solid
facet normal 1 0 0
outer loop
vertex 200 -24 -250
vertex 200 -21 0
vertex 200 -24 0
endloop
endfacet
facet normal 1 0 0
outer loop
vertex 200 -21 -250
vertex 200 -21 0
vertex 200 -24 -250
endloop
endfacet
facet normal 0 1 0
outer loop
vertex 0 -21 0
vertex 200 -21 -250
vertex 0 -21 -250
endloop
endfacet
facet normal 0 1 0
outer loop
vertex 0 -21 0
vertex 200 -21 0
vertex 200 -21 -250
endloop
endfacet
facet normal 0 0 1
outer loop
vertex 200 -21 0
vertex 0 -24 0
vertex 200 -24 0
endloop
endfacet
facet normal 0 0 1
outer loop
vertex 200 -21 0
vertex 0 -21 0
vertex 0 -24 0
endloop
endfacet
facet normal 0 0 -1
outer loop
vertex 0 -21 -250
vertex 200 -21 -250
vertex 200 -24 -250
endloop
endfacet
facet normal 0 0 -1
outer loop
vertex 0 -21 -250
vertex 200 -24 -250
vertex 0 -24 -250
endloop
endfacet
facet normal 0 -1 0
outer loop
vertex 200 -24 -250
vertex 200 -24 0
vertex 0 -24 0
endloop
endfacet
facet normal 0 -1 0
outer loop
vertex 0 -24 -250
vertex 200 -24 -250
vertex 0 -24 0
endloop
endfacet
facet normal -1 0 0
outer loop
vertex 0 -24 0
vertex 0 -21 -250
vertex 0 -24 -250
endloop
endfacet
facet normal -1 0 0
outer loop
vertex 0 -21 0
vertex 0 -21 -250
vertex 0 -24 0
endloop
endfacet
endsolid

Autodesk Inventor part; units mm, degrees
ref_plane "YZ Plane" through (0, 0, 0) normal (1, 0, 0) x (0, 1, 0)
ref_plane "XZ Plane" through (0, 0, 0) normal (0, 1, 0) x (-1, 0, 0)
ref_plane "XY Plane" through (0, 0, 0) normal (0, 0, 1) x (1, 0, 0)
sketch "block" plane through (0, 0, 0) normal (0, 1, 0) x (-1, 0, 0)
  line L0 (0, 0) -> (-200, 0)
  line L1 (-200, 0) -> (-200, -250)
  line L2 (-200, -250) -> (0, -250)
  line L3 (0, -250) -> (0, 0)
  dimension "d31" = 200
  dimension "d32" = 250
extrude "ext_block" add sketch "block" against normal blind 24
shell "Shell2" thickness 3 removed faces 0
sketch "lines_base" plane through (0, 0, 0) normal (0, 1, 0) x (-1, 0, 0)
  line L0 (0, 0) -> (-200, 0)
  line L1 (-200, 0) -> (-200, -250)
  line L2 (-200, -250) -> (0, -250)
  line L3 (0, -250) -> (0, 0)
  circle A0 centre (-65, -60) radius 6
  circle A1 centre (-125, -80) radius 6
  circle A2 centre (-65, -60) radius 12.5
  circle A3 centre (-65, -60) radius 8.5
  circle A4 centre (-125, -80) radius 8.5
  circle A5 centre (-125, -80) radius 12.5
  circle A6 centre (-175, -125) radius 3
  line L4 (-175, -125) -> (-175, -209)
  line L5 (-175, -125) -> (-91, -125) construction
  circle A7 centre (-175, -139) radius 3
  circle A8 centre (-175, -153) radius 3
  circle A9 centre (-175, -167) radius 3
  circle A10 centre (-175, -181) radius 3
  circle A11 centre (-175, -195) radius 3
  circle A12 centre (-175, -209) radius 3
  circle A13 centre (-95, -185) radius 2.5
  circle A14 centre (-95, -185) radius 5
  point P0 (-200, -125)
  dimension "d0" = 200
  dimension "d1" = 250
  dimension "d2" = 12
  dimension "d3" = 12
  dimension "d4" = 25
  dimension "d5" = 17
  dimension "d6" = 17
  dimension "d7" = 25
  dimension "d8" = 75
  dimension "d9" = 80
  dimension "d10" = 65
  dimension "d11" = 60
  dimension "d12" = 6
  dimension "d13" = 84
  dimension "d14" = 90
  dimension "d15" = 25
  dimension "d16" = 125
  dimension "d19" = 14
  dimension "d24" = 5
  dimension "d25" = 10
  dimension "d26" = 65
  dimension "d27" = 95
extrude "holes" cut sketch "lines_base" against normal up to surface (3 mm away) contours A0 | A1 | A6 | A7 L4 | L4 A7 | A8 L4 | L4 A8 | A9 L4 | L4 A9 | A10 L4 | L4 A10 | A11 L4 | L4 A11 | A12 | A13
sketch "Sketch4" plane through (200, 0, -250) normal (0, 0, -1) x (-1, 0, 0)
  line L0 (188, -4) -> (169, -4)
  line L1 (169, -4) -> (169, -17)
  line L2 (169, -17) -> (188, -17)
  line L3 (188, -17) -> (188, -4)
  line L4 (0, 0) -> (200, 0) projected
  line L5 (200, 0) -> (200, -24) projected
  dimension "d40" = 19
  dimension "d41" = 13
  dimension "d42" = 4
  dimension "d43" = 12
extrude "pwr_button_hole" cut sketch "Sketch4" against normal up to surface (3 mm away)
chamfer "back_cover_support" distance 4 angle 45 4 edges at (100, -21, -3) (3, -21, -125) (197, -21, -125) (100, -21, -247)
sketch "Sketch5" plane through (7, -21, -243) normal (0, 1, 0) x (1, 0, 0)
  line L0 (-20.9366, 21.7948) -> (229.9216, 21.7948)
  line L1 (229.9216, 21.7948) -> (229.9216, -260.9184)
  line L2 (229.9216, -260.9184) -> (-20.9366, -260.9184)
  line L3 (-20.9366, -260.9184) -> (-20.9366, 21.7948)
  point P0 (-7, -243)
extrude "back_cover_cut" cut sketch "Sketch5" along normal through all
properties part number "back_cover"
